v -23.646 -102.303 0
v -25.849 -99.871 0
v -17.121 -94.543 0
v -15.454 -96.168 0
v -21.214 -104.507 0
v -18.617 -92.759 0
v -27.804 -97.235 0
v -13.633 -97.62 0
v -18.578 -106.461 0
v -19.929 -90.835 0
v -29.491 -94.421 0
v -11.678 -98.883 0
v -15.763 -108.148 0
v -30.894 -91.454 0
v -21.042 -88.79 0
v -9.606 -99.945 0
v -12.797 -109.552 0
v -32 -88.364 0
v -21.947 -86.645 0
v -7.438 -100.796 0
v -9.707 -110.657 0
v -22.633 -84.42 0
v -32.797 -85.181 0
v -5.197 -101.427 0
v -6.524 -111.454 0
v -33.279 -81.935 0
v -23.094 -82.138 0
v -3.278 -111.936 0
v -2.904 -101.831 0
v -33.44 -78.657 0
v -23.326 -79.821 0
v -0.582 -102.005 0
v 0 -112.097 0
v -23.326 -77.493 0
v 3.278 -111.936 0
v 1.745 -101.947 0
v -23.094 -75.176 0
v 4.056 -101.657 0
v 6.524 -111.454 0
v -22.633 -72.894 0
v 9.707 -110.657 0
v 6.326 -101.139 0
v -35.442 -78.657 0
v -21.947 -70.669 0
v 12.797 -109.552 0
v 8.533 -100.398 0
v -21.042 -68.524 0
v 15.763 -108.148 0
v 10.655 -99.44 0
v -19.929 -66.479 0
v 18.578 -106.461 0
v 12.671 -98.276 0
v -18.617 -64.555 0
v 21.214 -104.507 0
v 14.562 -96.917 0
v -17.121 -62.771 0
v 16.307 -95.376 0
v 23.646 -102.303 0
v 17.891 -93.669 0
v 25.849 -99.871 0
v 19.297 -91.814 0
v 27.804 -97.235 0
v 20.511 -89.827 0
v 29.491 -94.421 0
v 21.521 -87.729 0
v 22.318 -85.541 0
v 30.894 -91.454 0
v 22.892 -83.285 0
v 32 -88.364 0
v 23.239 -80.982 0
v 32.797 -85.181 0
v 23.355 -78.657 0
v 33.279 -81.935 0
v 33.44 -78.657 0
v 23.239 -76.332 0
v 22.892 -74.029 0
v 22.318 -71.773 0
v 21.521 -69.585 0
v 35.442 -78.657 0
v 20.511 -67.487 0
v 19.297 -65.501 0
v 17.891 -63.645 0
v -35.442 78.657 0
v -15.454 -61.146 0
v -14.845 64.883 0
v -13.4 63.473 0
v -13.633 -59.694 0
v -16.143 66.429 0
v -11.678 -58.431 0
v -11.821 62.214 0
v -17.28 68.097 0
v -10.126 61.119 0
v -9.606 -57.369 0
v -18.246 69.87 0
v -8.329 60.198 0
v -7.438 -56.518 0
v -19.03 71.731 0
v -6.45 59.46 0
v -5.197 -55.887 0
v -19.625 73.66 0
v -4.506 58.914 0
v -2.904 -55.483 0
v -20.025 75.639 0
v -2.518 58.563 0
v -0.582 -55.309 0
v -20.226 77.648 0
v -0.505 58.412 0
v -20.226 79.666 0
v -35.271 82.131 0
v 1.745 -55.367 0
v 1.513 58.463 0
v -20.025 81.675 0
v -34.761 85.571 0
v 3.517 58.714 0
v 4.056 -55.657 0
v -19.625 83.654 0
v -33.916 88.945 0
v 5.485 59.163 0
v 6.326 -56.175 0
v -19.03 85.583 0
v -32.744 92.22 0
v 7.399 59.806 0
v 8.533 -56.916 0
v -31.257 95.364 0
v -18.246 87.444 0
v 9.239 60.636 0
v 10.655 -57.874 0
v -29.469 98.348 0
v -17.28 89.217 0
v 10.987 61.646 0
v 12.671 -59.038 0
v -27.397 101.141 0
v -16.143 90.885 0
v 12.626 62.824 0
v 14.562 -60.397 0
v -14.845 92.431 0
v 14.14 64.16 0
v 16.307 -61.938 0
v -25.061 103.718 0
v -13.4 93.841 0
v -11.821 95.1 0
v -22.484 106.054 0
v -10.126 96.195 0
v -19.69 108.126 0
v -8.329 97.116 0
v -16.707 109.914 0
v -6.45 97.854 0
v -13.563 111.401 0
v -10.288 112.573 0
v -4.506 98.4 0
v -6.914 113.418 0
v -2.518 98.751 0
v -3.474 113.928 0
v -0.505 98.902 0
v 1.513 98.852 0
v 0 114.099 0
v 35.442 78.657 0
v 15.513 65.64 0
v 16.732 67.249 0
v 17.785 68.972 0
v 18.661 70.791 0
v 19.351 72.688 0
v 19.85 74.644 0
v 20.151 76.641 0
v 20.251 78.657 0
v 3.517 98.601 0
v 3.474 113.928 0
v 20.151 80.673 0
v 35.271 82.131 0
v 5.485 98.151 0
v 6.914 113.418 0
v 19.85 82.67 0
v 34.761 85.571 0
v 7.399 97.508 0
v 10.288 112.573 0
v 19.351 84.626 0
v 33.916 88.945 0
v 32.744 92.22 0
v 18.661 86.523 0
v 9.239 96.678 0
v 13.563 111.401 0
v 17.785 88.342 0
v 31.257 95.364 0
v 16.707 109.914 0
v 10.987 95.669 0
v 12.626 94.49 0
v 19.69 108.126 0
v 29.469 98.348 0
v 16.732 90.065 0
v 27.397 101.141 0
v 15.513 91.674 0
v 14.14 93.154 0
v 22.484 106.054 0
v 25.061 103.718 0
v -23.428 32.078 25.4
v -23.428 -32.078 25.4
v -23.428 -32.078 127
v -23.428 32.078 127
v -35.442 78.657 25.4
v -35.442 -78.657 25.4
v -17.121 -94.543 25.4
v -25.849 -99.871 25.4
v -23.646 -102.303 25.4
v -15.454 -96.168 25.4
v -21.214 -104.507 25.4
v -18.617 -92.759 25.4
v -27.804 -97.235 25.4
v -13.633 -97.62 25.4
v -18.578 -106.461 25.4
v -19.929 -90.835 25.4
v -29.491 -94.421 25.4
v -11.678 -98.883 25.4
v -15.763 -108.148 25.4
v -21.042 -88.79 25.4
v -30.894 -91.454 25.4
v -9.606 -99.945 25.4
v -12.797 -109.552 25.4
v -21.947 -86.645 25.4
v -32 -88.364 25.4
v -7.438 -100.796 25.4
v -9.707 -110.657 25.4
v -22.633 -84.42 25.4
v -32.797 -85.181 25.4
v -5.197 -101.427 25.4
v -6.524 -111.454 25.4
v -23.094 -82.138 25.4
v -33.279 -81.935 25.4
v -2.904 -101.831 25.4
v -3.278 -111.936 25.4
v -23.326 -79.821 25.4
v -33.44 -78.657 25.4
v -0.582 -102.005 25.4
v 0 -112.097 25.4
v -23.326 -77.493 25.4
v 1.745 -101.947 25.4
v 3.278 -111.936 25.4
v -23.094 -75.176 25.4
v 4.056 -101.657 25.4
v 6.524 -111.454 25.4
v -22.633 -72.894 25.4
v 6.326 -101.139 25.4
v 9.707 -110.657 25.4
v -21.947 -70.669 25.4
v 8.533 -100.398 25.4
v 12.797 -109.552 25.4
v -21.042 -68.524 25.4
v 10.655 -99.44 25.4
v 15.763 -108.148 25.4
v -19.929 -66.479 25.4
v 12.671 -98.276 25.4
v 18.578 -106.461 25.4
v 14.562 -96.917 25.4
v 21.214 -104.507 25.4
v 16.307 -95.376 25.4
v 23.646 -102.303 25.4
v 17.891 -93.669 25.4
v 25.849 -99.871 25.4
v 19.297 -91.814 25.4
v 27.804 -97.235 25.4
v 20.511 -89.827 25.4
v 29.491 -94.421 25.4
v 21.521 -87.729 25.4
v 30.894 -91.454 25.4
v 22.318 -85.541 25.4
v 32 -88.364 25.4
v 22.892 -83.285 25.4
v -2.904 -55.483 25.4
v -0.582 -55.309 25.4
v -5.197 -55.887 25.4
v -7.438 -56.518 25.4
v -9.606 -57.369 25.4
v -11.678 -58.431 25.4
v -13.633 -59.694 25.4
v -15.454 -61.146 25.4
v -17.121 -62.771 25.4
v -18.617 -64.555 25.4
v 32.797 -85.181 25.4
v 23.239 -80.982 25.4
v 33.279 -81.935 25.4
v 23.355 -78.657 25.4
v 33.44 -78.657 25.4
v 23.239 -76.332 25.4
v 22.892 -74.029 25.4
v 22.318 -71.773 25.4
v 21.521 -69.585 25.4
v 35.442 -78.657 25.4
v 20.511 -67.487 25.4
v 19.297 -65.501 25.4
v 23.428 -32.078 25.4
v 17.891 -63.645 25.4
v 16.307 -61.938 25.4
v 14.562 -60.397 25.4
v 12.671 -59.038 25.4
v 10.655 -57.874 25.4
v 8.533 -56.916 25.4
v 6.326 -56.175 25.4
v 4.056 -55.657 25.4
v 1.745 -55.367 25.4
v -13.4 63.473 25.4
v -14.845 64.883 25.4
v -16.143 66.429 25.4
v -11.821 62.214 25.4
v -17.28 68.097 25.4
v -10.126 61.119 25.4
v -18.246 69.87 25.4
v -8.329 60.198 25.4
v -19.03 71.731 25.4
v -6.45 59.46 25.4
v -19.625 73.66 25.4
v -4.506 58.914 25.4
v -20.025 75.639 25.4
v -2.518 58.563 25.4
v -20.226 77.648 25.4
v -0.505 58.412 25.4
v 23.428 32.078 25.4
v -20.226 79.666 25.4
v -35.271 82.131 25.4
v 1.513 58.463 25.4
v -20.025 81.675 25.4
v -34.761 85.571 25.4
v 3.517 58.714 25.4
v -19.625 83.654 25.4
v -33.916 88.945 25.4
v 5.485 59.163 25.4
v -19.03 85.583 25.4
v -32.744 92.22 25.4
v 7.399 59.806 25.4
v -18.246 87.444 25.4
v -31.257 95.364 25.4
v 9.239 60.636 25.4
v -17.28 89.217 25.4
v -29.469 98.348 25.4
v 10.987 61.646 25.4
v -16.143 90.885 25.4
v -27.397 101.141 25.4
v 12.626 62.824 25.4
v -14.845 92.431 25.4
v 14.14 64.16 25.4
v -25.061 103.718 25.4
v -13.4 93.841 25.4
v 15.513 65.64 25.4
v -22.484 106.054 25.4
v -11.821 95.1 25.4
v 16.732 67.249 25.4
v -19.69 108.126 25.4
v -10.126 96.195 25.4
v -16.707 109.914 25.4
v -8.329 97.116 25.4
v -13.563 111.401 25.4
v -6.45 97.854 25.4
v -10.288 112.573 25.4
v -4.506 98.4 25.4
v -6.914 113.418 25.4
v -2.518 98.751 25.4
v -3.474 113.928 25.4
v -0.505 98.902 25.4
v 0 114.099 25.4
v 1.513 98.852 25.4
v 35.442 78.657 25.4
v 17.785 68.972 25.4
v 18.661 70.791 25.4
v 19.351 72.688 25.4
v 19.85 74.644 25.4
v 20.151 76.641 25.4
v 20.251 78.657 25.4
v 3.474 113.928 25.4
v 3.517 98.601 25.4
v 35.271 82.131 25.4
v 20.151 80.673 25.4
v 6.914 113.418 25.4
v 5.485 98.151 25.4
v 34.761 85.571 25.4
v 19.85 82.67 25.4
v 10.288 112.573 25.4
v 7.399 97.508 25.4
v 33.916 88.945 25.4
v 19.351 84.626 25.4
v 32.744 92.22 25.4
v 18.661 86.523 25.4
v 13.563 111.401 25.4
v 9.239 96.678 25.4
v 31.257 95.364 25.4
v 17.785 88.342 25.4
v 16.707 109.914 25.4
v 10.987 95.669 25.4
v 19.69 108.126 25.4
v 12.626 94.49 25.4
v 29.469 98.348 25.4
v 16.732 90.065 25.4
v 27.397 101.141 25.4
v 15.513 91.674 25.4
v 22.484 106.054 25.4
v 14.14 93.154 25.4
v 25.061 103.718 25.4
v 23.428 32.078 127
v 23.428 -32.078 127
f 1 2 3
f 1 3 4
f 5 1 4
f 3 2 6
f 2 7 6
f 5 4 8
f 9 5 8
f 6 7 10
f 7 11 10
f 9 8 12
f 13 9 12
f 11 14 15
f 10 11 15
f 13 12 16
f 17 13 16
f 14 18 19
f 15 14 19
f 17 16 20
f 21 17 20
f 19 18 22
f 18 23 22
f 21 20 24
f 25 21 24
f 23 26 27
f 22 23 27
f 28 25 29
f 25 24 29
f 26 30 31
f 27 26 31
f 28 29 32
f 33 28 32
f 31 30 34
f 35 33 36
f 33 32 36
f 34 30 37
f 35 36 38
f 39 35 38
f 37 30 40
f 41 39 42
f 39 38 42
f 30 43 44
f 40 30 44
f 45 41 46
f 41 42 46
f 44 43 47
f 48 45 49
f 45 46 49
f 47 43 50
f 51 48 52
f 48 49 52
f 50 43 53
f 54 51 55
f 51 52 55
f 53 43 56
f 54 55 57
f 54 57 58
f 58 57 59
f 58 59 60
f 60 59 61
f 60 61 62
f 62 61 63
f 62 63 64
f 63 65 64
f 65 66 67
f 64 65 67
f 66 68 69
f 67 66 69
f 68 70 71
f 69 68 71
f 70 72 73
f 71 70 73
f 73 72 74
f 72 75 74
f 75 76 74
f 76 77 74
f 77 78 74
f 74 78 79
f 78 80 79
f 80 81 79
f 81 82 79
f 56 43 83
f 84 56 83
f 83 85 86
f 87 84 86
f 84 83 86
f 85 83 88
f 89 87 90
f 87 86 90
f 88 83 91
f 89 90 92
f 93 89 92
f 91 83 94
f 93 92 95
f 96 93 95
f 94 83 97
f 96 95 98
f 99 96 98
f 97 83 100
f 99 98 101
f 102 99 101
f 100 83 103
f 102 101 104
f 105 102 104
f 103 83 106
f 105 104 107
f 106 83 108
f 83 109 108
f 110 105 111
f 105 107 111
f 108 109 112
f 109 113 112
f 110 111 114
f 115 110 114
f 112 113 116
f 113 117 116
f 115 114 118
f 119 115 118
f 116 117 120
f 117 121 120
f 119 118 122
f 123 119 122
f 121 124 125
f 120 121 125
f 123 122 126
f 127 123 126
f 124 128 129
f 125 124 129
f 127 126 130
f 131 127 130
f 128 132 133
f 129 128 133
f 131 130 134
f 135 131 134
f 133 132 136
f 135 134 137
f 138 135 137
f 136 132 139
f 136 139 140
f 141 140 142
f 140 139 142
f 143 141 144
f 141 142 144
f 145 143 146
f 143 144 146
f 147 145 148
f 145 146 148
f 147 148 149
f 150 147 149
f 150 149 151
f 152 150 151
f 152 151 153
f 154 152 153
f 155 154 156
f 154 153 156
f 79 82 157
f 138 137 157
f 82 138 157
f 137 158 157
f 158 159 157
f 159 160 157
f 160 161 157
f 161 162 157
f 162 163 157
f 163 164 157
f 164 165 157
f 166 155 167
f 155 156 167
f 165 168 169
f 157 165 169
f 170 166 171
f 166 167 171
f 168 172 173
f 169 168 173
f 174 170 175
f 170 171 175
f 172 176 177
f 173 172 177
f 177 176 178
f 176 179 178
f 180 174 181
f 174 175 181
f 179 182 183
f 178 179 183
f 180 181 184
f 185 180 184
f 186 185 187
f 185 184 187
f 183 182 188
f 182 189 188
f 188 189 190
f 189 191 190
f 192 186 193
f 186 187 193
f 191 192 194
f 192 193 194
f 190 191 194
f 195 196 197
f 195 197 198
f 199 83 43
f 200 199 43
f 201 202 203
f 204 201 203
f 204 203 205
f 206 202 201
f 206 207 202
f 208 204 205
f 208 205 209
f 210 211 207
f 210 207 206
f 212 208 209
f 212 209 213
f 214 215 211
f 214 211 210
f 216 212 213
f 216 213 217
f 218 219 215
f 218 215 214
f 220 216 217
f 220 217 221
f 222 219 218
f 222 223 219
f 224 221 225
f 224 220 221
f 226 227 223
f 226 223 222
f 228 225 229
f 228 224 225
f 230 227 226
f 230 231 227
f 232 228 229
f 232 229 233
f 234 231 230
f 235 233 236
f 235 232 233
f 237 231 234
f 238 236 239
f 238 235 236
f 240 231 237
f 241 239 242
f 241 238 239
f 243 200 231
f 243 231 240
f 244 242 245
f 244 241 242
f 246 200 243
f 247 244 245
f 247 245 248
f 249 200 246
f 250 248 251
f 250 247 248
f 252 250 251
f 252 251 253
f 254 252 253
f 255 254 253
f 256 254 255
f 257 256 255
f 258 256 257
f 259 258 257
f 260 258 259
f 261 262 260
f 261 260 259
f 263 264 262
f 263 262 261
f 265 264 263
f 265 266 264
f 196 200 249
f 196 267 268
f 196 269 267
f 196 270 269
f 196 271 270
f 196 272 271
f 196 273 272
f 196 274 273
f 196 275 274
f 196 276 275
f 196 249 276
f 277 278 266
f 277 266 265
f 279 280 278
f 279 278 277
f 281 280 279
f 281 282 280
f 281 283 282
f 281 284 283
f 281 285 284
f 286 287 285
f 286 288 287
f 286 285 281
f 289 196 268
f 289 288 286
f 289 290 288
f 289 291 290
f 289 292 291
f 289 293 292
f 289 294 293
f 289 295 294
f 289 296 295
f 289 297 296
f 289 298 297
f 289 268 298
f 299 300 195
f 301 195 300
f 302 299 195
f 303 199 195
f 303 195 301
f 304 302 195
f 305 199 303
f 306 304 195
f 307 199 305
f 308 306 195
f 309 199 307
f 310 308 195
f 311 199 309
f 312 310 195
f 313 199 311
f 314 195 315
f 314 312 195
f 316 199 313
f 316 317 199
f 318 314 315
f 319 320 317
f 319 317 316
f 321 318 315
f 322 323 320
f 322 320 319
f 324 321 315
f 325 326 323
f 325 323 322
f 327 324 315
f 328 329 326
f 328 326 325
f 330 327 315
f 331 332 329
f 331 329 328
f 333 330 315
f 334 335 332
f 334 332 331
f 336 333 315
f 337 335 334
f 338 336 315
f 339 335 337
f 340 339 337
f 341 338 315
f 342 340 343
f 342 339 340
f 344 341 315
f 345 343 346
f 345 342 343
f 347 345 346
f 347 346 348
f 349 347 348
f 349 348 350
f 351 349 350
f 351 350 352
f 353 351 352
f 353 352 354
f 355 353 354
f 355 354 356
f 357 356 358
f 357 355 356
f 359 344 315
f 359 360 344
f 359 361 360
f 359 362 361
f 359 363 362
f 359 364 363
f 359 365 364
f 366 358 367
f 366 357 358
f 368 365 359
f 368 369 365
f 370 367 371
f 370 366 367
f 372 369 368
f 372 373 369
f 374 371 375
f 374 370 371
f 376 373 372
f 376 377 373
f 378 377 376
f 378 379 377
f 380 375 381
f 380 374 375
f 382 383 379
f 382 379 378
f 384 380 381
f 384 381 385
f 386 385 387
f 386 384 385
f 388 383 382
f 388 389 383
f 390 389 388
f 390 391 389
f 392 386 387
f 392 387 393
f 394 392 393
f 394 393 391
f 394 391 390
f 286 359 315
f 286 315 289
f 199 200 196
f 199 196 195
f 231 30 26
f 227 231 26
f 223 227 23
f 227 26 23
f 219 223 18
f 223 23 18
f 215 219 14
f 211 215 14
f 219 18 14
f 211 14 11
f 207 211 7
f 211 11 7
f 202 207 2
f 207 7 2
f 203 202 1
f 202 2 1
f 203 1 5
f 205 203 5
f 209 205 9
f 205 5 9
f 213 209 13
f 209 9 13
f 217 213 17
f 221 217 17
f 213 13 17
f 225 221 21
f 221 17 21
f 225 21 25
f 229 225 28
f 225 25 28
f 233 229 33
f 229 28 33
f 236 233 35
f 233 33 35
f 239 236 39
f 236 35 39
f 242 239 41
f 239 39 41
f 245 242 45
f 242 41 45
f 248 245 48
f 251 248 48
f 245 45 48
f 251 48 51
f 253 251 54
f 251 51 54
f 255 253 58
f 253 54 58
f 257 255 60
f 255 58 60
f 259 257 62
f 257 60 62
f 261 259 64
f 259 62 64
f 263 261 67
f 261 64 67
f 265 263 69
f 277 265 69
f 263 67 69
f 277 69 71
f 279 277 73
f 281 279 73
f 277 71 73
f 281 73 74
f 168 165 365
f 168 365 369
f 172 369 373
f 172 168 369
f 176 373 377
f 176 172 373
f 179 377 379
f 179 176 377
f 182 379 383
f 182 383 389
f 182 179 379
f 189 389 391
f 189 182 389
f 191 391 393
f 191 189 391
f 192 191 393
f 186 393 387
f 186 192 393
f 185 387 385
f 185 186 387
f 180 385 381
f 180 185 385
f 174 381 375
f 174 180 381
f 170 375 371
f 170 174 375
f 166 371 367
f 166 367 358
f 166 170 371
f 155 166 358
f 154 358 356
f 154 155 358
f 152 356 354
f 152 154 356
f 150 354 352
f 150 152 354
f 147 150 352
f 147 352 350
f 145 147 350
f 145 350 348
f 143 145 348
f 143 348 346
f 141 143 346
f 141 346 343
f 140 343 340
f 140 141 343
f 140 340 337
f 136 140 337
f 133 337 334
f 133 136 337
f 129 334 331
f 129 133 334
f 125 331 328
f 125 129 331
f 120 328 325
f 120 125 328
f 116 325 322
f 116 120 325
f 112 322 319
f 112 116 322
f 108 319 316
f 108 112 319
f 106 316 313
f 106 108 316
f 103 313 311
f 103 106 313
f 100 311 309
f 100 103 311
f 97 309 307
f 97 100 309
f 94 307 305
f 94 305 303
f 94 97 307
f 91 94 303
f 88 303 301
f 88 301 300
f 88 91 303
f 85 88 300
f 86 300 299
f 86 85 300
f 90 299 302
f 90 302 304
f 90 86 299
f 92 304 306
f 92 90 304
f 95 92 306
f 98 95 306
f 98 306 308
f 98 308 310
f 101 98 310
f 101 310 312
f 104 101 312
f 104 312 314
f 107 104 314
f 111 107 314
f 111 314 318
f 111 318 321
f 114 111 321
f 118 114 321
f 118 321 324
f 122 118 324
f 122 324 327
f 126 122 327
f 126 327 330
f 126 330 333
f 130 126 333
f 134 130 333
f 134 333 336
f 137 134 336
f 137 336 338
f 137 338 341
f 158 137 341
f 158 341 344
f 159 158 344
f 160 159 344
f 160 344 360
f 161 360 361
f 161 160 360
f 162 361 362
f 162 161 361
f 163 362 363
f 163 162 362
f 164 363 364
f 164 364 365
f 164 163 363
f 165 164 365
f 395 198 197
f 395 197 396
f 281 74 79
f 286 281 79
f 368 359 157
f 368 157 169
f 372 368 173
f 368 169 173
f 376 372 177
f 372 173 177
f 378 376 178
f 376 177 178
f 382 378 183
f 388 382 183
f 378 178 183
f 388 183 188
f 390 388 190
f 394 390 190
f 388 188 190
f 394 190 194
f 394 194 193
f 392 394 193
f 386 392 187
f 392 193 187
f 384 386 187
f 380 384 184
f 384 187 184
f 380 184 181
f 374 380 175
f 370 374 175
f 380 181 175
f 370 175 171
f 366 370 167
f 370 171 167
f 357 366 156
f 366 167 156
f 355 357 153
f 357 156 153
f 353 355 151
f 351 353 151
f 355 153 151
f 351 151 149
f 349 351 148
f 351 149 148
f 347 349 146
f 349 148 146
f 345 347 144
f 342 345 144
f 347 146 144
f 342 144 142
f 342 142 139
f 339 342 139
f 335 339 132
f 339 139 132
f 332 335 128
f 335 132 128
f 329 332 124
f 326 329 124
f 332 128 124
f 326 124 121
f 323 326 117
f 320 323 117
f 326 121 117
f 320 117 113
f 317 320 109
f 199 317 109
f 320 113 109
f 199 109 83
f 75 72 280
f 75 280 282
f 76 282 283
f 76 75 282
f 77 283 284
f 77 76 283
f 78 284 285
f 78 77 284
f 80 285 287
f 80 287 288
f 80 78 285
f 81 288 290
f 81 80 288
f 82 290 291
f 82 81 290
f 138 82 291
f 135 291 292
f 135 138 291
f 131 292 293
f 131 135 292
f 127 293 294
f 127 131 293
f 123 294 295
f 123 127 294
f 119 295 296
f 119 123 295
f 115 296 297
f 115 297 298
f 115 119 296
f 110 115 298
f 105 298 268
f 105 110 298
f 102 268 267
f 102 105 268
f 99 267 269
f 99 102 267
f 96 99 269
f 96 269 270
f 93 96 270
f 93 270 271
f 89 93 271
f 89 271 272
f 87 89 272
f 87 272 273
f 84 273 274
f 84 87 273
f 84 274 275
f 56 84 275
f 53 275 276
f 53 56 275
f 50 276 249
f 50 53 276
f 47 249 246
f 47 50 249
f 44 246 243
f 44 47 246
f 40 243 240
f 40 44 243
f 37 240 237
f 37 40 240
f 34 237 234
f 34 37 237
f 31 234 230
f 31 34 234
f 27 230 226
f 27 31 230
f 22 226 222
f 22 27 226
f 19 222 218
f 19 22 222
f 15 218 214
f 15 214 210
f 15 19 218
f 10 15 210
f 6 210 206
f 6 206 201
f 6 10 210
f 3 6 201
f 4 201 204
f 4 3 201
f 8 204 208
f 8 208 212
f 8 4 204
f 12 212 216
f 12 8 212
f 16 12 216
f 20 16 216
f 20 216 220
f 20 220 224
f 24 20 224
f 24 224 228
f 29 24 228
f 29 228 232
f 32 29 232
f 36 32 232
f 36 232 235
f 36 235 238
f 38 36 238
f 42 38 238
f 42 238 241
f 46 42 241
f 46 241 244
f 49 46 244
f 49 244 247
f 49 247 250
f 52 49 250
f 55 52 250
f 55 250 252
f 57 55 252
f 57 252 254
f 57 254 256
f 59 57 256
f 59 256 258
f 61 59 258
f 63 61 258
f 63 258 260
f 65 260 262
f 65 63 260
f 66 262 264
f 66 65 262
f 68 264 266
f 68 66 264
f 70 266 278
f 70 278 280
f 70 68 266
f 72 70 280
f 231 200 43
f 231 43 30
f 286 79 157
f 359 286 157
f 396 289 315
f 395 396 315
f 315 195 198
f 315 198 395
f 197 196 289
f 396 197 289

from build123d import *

# Parameters (mm, degrees)
F0_W     = 46.8558967113
F0_H     = 64.1569495201
F1_DEPTH = 127
F2_R     = 23.3551916442
F2_W     = 46.8558967113
F2_H     = 64.1569495201
F2_R_2   = 20.2511661355
F3_DEPTH = 25.4


# Not quite as in the source:
# - a feature of the source that left no trace in its solid (it failed there, or was rolled back) is left out


with BuildPart() as f1:
    # F0 (on Top) → F1 (new body)
    with BuildSketch(Plane.XY):
        Rectangle(F0_W, F0_H)
    extrude(amount=F1_DEPTH)

    # F0 (on Top) + F2 (on face) → F3 (join)
    with BuildSketch(Plane.XY):
        Rectangle(F0_W, F0_H)
    with BuildSketch(Plane.XY):
        with BuildLine():
            Line((33.4399625558, -78.6570606891), (35.4419024774, -78.6570606891))
            Line((35.4419024774, -78.6570606891), (35.4419024774, 78.6570606891))
            ThreePointArc((35.4419024774, 78.6570606891), (0, 114.0989631665), (-35.4419024774, 78.6570606891))
            Line((-35.4419024774, 78.6570606891), (-35.4419024774, -78.6570606891))
            Line((-35.4419024774, -78.6570606891), (-33.4399625558, -78.6570606891))
            ThreePointArc((-33.4399625558, -78.6570606891), (0, -112.0970232449), (33.4399625558, -78.6570606891))
        make_face()
        with Locations((0, -78.6570606891)):
            Circle(F2_R, mode=Mode.SUBTRACT)
        Rectangle(F2_W, F2_H, mode=Mode.SUBTRACT)
        with Locations((0, 78.6570606891)):
            Circle(F2_R_2, mode=Mode.SUBTRACT)
    extrude(amount=F3_DEPTH)


solid = f1.part
